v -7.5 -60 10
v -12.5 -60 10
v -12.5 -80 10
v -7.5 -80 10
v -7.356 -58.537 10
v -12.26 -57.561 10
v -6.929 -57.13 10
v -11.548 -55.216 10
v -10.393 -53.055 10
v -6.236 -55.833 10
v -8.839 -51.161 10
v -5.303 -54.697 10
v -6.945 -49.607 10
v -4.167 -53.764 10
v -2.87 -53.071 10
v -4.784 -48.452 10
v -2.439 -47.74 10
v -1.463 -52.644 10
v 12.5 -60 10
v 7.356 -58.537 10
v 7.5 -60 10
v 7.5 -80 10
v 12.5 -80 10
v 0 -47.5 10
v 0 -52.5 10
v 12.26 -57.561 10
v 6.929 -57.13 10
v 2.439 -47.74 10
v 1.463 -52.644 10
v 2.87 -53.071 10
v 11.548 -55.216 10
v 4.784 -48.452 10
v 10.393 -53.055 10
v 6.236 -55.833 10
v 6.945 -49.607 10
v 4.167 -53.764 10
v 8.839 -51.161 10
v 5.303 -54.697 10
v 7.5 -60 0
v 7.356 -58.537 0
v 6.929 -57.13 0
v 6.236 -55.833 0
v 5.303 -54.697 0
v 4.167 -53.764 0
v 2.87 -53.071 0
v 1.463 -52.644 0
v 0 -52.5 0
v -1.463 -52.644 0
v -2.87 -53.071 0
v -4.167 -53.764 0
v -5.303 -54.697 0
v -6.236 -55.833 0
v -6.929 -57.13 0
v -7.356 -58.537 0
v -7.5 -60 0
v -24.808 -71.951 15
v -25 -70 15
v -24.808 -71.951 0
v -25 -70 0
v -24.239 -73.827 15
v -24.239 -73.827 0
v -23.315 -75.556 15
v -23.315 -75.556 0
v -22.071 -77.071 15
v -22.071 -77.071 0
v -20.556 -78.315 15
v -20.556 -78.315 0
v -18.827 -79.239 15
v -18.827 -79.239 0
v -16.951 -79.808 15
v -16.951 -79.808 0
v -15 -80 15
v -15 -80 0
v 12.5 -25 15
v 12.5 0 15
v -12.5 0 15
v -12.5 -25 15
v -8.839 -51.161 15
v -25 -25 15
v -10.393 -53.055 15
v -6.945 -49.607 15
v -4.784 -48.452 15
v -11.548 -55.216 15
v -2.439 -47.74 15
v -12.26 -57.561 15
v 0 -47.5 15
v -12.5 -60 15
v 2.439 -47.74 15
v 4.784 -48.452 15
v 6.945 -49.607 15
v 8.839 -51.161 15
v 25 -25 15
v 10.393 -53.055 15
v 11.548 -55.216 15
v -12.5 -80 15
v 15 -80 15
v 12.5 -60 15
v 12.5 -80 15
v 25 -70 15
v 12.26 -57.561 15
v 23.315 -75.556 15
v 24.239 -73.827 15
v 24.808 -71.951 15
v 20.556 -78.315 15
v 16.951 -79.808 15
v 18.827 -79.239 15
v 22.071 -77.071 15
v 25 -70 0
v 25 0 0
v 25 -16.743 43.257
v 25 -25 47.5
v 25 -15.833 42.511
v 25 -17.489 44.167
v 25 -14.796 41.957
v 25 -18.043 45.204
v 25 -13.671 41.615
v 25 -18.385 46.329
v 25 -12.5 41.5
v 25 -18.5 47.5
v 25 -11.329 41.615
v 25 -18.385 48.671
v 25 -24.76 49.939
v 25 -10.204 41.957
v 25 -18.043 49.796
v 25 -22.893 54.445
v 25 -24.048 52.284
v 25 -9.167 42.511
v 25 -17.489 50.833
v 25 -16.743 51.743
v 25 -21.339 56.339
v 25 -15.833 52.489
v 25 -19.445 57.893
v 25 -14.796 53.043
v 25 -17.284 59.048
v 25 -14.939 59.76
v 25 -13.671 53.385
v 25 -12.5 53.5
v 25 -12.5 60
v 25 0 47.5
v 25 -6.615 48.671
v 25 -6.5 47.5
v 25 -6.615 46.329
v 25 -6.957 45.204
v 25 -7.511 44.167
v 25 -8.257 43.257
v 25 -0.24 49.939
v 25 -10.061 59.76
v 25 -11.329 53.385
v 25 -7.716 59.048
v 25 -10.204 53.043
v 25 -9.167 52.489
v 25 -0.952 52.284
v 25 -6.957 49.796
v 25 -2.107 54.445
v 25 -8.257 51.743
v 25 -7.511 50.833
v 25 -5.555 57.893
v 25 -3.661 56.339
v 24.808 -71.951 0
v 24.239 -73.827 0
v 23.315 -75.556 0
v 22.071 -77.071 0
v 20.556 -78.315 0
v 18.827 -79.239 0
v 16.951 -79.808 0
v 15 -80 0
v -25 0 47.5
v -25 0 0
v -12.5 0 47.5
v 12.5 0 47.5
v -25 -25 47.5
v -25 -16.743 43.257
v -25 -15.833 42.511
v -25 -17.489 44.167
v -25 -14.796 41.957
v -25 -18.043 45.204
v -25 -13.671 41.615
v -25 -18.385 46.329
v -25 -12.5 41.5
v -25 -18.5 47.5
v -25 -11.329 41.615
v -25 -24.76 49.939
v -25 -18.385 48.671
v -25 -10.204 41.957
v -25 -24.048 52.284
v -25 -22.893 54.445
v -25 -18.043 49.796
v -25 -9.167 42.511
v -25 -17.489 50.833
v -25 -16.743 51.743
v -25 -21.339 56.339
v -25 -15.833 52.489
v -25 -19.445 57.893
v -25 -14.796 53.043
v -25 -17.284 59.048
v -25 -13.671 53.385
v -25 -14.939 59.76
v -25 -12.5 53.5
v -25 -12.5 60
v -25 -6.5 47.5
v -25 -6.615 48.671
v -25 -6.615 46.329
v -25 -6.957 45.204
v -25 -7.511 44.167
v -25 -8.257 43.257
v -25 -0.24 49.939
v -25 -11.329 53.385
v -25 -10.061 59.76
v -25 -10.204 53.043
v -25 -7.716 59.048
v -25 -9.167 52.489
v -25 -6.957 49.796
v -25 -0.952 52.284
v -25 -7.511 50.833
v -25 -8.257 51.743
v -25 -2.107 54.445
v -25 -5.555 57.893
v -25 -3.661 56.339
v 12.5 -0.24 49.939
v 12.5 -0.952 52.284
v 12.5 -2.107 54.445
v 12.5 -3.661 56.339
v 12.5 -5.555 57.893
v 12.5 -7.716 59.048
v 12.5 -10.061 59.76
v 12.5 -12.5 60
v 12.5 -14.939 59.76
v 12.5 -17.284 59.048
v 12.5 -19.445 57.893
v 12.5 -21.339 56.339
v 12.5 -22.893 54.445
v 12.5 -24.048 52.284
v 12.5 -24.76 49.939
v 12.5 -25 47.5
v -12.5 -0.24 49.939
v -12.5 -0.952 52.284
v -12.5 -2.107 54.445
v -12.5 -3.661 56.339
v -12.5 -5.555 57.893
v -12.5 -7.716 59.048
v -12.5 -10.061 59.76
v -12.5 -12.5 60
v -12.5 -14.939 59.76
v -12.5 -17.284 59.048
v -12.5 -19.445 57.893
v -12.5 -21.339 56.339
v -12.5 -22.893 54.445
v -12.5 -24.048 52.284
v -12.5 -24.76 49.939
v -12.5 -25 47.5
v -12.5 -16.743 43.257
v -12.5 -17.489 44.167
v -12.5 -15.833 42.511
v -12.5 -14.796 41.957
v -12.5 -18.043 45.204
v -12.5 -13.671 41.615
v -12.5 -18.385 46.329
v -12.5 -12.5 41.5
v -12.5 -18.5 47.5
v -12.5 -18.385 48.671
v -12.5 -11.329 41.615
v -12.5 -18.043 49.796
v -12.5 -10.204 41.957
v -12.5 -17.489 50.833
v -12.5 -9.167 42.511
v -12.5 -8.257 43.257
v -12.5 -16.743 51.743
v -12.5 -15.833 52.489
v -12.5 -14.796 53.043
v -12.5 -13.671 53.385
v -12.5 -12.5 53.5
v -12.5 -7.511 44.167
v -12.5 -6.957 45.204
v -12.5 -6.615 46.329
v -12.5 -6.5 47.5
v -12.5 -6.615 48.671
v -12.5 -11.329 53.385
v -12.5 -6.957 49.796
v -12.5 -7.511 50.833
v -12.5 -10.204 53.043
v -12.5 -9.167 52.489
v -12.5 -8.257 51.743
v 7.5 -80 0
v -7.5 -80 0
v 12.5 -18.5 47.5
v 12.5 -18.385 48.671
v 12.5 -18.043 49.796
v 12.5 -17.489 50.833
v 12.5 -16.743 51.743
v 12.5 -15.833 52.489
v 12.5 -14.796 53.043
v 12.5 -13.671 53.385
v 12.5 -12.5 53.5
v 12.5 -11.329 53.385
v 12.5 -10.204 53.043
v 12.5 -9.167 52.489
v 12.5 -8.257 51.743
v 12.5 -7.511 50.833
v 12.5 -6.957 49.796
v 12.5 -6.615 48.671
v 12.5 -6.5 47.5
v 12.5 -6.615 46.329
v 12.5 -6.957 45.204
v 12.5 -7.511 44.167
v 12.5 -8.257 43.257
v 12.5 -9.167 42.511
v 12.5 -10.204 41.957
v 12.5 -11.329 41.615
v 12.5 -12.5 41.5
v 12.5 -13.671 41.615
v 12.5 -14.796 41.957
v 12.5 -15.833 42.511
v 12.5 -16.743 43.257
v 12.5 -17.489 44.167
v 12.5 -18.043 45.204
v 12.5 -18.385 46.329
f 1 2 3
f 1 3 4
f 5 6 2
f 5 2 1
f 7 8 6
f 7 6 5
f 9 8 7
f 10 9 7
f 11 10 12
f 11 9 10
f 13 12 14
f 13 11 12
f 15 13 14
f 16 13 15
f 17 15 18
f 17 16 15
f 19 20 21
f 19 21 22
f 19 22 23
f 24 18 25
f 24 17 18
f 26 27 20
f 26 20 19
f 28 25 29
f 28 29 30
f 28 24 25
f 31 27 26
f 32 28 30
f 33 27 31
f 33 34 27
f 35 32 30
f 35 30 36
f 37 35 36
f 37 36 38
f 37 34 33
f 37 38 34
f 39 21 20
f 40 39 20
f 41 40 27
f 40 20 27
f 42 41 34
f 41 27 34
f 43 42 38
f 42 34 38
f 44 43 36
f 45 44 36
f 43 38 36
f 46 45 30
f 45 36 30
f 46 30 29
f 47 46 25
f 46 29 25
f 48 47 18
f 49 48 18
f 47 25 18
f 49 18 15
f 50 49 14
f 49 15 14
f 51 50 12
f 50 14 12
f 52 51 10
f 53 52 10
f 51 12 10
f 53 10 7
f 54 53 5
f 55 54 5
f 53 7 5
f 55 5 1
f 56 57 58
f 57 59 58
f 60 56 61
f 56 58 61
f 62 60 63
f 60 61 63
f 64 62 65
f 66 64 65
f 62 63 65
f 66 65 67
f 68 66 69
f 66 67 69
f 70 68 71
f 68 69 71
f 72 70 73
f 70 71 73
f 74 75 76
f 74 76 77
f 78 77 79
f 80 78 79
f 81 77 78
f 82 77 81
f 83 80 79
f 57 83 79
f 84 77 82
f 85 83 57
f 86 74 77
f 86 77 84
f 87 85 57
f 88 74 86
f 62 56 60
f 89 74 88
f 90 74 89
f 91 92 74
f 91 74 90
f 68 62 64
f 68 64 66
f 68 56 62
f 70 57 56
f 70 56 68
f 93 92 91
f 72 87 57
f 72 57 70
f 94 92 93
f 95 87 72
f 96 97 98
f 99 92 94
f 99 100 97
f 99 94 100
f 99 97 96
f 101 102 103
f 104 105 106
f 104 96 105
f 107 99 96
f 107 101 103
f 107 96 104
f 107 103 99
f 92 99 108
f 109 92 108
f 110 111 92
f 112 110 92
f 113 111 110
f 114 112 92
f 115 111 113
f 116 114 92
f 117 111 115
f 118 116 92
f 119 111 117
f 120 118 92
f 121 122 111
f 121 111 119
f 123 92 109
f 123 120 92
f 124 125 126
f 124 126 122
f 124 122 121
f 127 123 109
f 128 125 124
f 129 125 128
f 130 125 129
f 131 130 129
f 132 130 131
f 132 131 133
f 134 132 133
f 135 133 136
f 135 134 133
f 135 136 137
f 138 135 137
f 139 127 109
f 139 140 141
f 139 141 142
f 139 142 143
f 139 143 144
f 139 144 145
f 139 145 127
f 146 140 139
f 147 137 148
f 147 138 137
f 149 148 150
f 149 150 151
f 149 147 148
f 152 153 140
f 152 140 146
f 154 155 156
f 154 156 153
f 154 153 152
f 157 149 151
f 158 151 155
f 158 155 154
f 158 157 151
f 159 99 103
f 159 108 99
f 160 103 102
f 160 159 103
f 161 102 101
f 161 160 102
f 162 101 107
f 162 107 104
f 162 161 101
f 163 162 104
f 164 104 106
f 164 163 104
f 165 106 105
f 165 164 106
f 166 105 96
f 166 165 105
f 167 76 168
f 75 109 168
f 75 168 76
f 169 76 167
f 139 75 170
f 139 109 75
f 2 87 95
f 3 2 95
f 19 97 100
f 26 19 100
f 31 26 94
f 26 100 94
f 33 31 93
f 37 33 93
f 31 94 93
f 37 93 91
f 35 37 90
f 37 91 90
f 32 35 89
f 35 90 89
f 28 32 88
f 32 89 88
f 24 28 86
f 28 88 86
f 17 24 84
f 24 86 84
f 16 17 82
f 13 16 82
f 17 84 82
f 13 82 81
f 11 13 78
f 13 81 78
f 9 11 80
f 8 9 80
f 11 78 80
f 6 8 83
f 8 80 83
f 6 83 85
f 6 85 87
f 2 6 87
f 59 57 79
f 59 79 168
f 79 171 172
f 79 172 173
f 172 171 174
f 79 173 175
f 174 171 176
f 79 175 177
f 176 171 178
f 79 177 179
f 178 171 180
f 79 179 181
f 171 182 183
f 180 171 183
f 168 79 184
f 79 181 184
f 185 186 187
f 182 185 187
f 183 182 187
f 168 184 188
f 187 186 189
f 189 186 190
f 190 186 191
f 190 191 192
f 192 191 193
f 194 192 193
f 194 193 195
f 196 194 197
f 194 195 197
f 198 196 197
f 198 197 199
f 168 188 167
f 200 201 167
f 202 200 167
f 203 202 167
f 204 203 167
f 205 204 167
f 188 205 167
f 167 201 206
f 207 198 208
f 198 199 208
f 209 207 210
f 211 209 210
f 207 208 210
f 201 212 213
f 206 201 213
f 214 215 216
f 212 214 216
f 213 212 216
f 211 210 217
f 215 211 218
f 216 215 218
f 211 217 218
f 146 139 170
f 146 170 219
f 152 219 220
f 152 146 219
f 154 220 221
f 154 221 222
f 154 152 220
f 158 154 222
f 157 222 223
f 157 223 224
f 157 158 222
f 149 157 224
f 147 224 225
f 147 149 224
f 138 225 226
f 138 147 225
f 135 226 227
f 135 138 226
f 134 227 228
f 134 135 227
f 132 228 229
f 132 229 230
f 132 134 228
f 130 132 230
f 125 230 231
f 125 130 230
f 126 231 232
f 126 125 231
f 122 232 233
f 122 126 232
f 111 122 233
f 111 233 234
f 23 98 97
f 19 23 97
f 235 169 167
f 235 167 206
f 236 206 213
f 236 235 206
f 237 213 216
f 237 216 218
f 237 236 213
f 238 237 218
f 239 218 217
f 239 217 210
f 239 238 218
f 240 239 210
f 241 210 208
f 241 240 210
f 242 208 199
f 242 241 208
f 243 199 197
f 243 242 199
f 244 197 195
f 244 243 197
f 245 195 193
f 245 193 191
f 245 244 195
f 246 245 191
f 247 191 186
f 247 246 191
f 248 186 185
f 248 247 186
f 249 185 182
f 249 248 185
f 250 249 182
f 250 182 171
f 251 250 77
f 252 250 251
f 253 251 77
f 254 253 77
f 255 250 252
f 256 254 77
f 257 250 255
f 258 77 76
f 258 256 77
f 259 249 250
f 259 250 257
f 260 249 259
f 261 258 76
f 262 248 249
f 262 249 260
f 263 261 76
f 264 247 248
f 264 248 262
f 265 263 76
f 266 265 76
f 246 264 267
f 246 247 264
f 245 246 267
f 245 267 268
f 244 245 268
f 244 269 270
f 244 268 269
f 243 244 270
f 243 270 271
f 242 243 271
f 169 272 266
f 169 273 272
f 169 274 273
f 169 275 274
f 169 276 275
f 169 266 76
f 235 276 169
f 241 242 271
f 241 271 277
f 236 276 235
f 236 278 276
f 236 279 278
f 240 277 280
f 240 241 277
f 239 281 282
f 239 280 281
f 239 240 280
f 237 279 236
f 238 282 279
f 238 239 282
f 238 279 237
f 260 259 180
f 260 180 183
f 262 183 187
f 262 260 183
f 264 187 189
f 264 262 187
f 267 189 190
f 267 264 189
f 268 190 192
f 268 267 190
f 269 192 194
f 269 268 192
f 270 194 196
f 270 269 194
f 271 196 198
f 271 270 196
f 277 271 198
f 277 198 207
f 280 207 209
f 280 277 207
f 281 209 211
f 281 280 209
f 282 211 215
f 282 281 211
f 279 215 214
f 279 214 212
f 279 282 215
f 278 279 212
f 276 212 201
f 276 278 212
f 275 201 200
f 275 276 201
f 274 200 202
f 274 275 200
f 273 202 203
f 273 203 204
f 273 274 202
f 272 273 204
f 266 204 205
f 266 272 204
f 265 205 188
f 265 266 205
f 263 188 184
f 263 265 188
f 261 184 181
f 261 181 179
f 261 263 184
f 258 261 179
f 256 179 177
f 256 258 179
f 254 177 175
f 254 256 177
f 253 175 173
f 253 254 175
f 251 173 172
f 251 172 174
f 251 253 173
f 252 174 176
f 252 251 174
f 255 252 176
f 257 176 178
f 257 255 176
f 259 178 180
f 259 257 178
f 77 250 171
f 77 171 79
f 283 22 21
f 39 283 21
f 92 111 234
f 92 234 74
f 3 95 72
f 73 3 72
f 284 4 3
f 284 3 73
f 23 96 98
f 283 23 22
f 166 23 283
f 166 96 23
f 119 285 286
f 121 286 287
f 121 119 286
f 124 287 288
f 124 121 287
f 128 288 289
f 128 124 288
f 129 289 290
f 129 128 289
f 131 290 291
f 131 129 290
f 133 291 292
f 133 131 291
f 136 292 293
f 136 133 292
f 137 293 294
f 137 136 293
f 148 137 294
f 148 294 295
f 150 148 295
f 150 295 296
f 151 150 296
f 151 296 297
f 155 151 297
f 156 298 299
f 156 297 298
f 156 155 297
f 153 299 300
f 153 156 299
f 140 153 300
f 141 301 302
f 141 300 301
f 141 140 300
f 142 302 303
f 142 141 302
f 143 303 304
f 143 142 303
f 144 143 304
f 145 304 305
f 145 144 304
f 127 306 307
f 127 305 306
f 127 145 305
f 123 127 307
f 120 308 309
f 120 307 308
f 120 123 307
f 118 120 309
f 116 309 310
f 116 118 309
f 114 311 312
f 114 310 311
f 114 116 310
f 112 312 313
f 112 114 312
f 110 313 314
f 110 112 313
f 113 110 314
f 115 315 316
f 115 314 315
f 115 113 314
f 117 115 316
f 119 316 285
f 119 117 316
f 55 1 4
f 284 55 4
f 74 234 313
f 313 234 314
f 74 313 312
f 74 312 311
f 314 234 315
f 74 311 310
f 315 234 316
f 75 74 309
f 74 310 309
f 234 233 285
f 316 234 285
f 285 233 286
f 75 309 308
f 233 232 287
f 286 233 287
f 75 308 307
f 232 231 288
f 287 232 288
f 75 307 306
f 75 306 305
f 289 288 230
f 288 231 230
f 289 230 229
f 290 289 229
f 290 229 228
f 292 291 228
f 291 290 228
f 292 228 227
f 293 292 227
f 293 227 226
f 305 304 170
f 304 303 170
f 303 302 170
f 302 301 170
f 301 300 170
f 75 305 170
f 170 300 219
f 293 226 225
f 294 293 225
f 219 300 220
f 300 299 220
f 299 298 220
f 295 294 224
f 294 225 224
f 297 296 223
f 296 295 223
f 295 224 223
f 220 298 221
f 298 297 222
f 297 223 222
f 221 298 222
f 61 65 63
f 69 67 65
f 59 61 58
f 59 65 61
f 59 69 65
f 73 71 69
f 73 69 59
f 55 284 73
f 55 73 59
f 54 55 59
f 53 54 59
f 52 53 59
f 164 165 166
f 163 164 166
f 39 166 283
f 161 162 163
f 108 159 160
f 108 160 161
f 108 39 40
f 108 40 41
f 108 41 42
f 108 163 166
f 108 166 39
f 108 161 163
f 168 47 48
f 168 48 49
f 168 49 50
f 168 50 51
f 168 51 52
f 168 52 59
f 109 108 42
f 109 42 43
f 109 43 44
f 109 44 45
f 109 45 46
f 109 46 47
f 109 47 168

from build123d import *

# Parameters (mm, degrees)
F1_DEPTH = 25
F2_DEPTH = 12.5
F3_R     = 10
F4_W     = 15
F4_H     = 5
F5_DEPTH = 15
F4_W_2   = 5
F6_DEPTH = 5


with BuildPart() as f1:
    # F0 (on Right) → F1 (new body, symmetric)
    with BuildSketch(Plane.YZ):
        Polygon((-80, 0), (0, 0), (0, 15), (-25, 15), (-80, 15), align=None)
        with BuildLine():
            Line((-25, 15), (0, 15))
            Line((0, 15), (0, 47.5))
            ThreePointArc((0, 47.5), (-12.5, 35), (-25, 47.5))
            Line((-25, 47.5), (-25, 15))
        make_face()
        with BuildLine():
            ThreePointArc((-25, 47.5), (-12.5, 35), (0, 47.5))
            Line((0, 47.5), (-6.5, 47.5))
            ThreePointArc((-6.5, 47.5), (-12.5, 41.5), (-18.5, 47.5))
            Line((-18.5, 47.5), (-25, 47.5))
        make_face()
        with BuildLine():
            Line((-6.5, 47.5), (0, 47.5))
            ThreePointArc((0, 47.5), (-12.5, 60), (-25, 47.5))
            Line((-25, 47.5), (-18.5, 47.5))
            ThreePointArc((-18.5, 47.5), (-12.5, 53.5), (-6.5, 47.5))
        make_face()
    extrude(amount=F1_DEPTH, both=True)

    # F0 (on Right) → F2 (cut, symmetric)
    with BuildSketch(Plane.YZ):
        with BuildLine():
            Line((-25, 15), (0, 15))
            Line((0, 15), (0, 47.5))
            ThreePointArc((0, 47.5), (-12.5, 35), (-25, 47.5))
            Line((-25, 47.5), (-25, 15))
        make_face()
        with BuildLine():
            ThreePointArc((-25, 47.5), (-12.5, 35), (0, 47.5))
            Line((0, 47.5), (-6.5, 47.5))
            ThreePointArc((-6.5, 47.5), (-12.5, 41.5), (-18.5, 47.5))
            Line((-18.5, 47.5), (-25, 47.5))
        make_face()
        with BuildLine():
            ThreePointArc((-18.5, 47.5), (-12.5, 41.5), (-6.5, 47.5))
            Line((-6.5, 47.5), (-18.5, 47.5))
        make_face()
        with BuildLine():
            Line((-18.5, 47.5), (-6.5, 47.5))
            ThreePointArc((-6.5, 47.5), (-12.5, 53.5), (-18.5, 47.5))
        make_face()
        with BuildLine():
            Line((-6.5, 47.5), (0, 47.5))
            ThreePointArc((0, 47.5), (-12.5, 60), (-25, 47.5))
            Line((-25, 47.5), (-18.5, 47.5))
            ThreePointArc((-18.5, 47.5), (-12.5, 53.5), (-6.5, 47.5))
        make_face()
    extrude(amount=F2_DEPTH, both=True, mode=Mode.SUBTRACT)

    # F3
    f3_edges = [f1.edges().sort_by_distance(p)[0] for p in [
        (25, -80, 7.5),
        (-25, -80, 7.5),
    ]]
    fillet(f3_edges, radius=F3_R)

    # F4 (on face) → F5 (cut, through all)
    with BuildSketch(Plane.XY.offset(15)):
        with BuildLine():
            Line((-7.5, -60), (-7.5, -75))
            Line((-7.5, -75), (7.5, -75))
            Line((7.5, -75), (7.5, -60))
            ThreePointArc((7.5, -60), (0, -52.5), (-7.5, -60))
        make_face()
        with Locations((0, -77.5)):
            Rectangle(F4_W, F4_H)
    extrude(amount=-F5_DEPTH, mode=Mode.SUBTRACT)

    # F4 (on face) → F6 (cut)
    with BuildSketch(Plane.XY.offset(15)):
        with BuildLine():
            Line((-12.5, -75), (-7.5, -75))
            Line((-7.5, -75), (-7.5, -60))
            ThreePointArc((-7.5, -60), (0, -52.5), (7.5, -60))
            Line((7.5, -60), (7.5, -75))
            Line((7.5, -75), (12.5, -75))
            Line((12.5, -75), (12.5, -60))
            ThreePointArc((12.5, -60), (0, -47.5), (-12.5, -60))
            Line((-12.5, -60), (-12.5, -75))
        make_face()
        with Locations((-10, -77.5)):
            Rectangle(F4_W_2, F4_H)
        with Locations((10, -77.5)):
            Rectangle(F4_W_2, F4_H)
    extrude(amount=-F6_DEPTH, mode=Mode.SUBTRACT)


solid = f1.part
